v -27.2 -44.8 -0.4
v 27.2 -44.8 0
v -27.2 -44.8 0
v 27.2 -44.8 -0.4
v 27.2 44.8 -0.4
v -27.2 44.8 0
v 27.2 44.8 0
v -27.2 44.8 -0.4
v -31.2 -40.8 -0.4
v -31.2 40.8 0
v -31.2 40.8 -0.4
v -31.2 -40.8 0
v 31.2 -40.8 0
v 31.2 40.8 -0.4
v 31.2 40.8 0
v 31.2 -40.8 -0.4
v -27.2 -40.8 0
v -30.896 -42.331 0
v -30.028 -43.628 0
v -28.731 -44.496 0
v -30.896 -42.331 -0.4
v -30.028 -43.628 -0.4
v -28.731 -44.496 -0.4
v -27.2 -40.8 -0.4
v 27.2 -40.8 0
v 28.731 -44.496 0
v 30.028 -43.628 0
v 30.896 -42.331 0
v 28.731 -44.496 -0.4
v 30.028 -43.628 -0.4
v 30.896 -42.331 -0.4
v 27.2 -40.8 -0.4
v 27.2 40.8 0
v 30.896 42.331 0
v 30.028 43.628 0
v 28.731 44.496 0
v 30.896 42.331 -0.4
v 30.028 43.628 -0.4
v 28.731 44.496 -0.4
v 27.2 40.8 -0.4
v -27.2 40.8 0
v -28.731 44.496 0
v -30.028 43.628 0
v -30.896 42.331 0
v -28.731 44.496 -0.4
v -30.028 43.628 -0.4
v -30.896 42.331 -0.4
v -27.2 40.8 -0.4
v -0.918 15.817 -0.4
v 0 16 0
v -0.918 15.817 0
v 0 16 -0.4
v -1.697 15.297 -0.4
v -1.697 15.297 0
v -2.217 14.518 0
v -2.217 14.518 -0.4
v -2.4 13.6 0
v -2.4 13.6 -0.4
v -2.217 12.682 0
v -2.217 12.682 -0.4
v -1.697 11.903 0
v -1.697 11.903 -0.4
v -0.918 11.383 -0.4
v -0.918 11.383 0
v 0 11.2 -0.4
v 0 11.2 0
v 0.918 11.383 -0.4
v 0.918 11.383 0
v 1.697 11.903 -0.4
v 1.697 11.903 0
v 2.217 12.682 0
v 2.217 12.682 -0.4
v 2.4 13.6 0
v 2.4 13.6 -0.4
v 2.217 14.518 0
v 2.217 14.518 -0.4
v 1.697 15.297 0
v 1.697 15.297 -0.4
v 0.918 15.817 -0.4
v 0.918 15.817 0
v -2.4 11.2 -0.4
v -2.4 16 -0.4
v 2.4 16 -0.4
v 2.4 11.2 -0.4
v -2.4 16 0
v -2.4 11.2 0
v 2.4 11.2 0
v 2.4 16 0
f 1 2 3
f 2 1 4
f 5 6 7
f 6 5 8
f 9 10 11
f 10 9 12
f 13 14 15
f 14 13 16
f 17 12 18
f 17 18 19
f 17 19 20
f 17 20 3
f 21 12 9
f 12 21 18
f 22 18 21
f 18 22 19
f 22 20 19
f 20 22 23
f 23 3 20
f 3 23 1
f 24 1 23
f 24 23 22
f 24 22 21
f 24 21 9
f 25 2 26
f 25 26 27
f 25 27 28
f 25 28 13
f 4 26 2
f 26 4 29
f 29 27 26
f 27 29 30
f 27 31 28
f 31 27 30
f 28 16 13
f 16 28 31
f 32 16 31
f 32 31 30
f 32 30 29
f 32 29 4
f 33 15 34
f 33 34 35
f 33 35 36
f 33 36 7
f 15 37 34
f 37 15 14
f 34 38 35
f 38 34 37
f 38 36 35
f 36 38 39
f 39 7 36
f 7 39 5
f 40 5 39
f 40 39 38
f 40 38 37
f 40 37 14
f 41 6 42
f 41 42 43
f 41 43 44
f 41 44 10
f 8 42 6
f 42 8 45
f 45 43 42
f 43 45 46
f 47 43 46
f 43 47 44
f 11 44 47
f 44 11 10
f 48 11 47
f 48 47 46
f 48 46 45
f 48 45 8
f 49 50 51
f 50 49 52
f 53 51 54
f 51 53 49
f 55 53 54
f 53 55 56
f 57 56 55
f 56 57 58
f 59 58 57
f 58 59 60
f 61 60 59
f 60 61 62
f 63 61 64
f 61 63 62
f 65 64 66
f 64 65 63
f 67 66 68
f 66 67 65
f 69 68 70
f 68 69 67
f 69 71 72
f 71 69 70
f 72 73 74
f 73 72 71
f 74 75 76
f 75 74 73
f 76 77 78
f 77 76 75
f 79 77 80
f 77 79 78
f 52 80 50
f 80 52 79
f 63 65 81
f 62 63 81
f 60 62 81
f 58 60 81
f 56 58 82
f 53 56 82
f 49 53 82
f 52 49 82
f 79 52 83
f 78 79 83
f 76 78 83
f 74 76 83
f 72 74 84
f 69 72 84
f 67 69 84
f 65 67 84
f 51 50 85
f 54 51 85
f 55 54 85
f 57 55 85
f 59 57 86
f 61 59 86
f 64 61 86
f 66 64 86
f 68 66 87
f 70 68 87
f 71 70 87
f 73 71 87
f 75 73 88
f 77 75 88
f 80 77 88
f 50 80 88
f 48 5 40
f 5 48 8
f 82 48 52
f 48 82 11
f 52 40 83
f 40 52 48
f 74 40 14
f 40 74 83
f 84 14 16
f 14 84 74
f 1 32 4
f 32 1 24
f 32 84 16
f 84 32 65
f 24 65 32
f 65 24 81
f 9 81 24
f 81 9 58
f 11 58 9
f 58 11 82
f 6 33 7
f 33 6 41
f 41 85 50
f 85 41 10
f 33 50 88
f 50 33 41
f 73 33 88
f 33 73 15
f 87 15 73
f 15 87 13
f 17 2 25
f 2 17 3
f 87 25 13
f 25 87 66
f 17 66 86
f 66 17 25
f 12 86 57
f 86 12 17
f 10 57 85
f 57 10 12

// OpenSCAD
// file: ../p/4-4edge.scad
use <../lib.scad>
function ldraw_lib__4_4edge() = [
// 0 Circle 1.0
// 0 Name: 4-4edge.dat
// 0 Author: James Jessiman
// 0 !LDRAW_ORG Primitive UPDATE 2017-01
// 0 !LICENSE Licensed under CC BY 2.0 and CC BY 4.0 : see CAreadme.txt
// 
// 0 BFC CERTIFY CCW
  [0,"BFC","CERTIFY"],
  [0,"BFC","CCW"],
// 
// 0 !HISTORY 1998-12-15 [PTadmin] Official Update 1998-10
// 0 !HISTORY 2005-12-28 [PTadmin] Official Update 2005-01
// 0 !HISTORY 2007-06-24 [PTadmin] Header formatted for Contributor Agreement
// 0 !HISTORY 2008-07-01 [PTadmin] Official Update 2008-01
// 0 !HISTORY 2017-01-15 [Steffen] BFCed
// 0 !HISTORY 2017-12-30 [PTadmin] Official Update 2017-01
// 
// 
// 2 24 1 0 0 0.9239 0 0.3827
  [2,24,1,0,0,0.9239,0,0.3827],
// 2 24 0.9239 0 0.3827 0.7071 0 0.7071
  [2,24,0.9239,0,0.3827,0.7071,0,0.7071],
// 2 24 0.7071 0 0.7071 0.3827 0 0.9239
  [2,24,0.7071,0,0.7071,0.3827,0,0.9239],
// 2 24 0.3827 0 0.9239 0 0 1
  [2,24,0.3827,0,0.9239,0,0,1],
// 2 24 0 0 1 -0.3827 0 0.9239
  [2,24,0,0,1,-0.3827,0,0.9239],
// 2 24 -0.3827 0 0.9239 -0.7071 0 0.7071
  [2,24,-0.3827,0,0.9239,-0.7071,0,0.7071],
// 2 24 -0.7071 0 0.7071 -0.9239 0 0.3827
  [2,24,-0.7071,0,0.7071,-0.9239,0,0.3827],
// 2 24 -0.9239 0 0.3827 -1 0 -0
  [2,24,-0.9239,0,0.3827,-1,0,-0],
// 2 24 -1 0 -0 -0.9239 0 -0.3827
  [2,24,-1,0,-0,-0.9239,0,-0.3827],
// 2 24 -0.9239 0 -0.3827 -0.7071 0 -0.7071
  [2,24,-0.9239,0,-0.3827,-0.7071,0,-0.7071],
// 2 24 -0.7071 0 -0.7071 -0.3827 0 -0.9239
  [2,24,-0.7071,0,-0.7071,-0.3827,0,-0.9239],
// 2 24 -0.3827 0 -0.9239 0 0 -1
  [2,24,-0.3827,0,-0.9239,0,0,-1],
// 2 24 0 0 -1 0.3827 0 -0.9239
  [2,24,0,0,-1,0.3827,0,-0.9239],
// 2 24 0.3827 0 -0.9239 0.7071 0 -0.7071
  [2,24,0.3827,0,-0.9239,0.7071,0,-0.7071],
// 2 24 0.7071 0 -0.7071 0.9239 0 -0.3827
  [2,24,0.7071,0,-0.7071,0.9239,0,-0.3827],
// 2 24 0.9239 0 -0.3827 1 0 0
  [2,24,0.9239,0,-0.3827,1,0,0],
];
module ldraw_lib__4_4edge(step=0, col=false, unit=2/5, alt=false, line=0.2, solid=!$preview)
    makepoly(ldraw_lib__4_4edge(), step=step, col=col, unit=unit, alt=alt, line=line, solid=solid);
ldraw_lib__4_4edge(line=0.2);
// file: ../p/4-4cyli.scad
use <../lib.scad>
function ldraw_lib__4_4cyli() = [
// 0 Cylinder 1.0
// 0 Name: 4-4cyli.dat
// 0 Author: James Jessiman
// 0 !LDRAW_ORG Primitive UPDATE 2005-01
// 0 !LICENSE Licensed under CC BY 2.0 and CC BY 4.0 : see CAreadme.txt
// 
// 0 BFC CERTIFY CCW
  [0,"BFC","CERTIFY"],
  [0,"BFC","CCW"],
// 
// 0 !HISTORY 1998-12-15 [PTadmin] Official Update 1998-10
// 0 !HISTORY 2002-03-23 [sbliss] Added BFC statement; merged headers from files in distributions LDraw 0.27 and Complete.
// 0 !HISTORY 2002-04-25 [PTadmin] Official Update 2002-02
// 0 !HISTORY 2004-12-14 [guyvivan] BFC CCW
// 0 !HISTORY 2005-12-28 [PTadmin] Official Update 2005-01
// 0 !HISTORY 2007-06-24 [PTadmin] Header formatted for Contributor Agreement
// 0 !HISTORY 2008-07-01 [PTadmin] Official Update 2008-01
// 
// 
// 4 16 1 1 0 0.9239 1 0.3827 0.9239 0 0.3827 1 0 0
  [4,16,1,1,0,0.9239,1,0.3827,0.9239,0,0.3827,1,0,0],
// 5 24 1 0 0 1 1 0 0.9239 0 0.3827 0.9239 0 -0.3827
  [5,24,1,0,0,1,1,0,0.9239,0,0.3827,0.9239,0,-0.3827],
// 4 16 0.9239 1 0.3827 0.7071 1 0.7071 0.7071 0 0.7071 0.9239 0 0.3827
  [4,16,0.9239,1,0.3827,0.7071,1,0.7071,0.7071,0,0.7071,0.9239,0,0.3827],
// 5 24 0.9239 0 0.3827 0.9239 1 0.3827 0.7071 0 0.7071 1 0 0
  [5,24,0.9239,0,0.3827,0.9239,1,0.3827,0.7071,0,0.7071,1,0,0],
// 4 16 0.7071 1 0.7071 0.3827 1 0.9239 0.3827 0 0.9239 0.7071 0 0.7071
  [4,16,0.7071,1,0.7071,0.3827,1,0.9239,0.3827,0,0.9239,0.7071,0,0.7071],
// 5 24 0.7071 0 0.7071 0.7071 1 0.7071 0.3827 0 0.9239 0.9239 0 0.3827
  [5,24,0.7071,0,0.7071,0.7071,1,0.7071,0.3827,0,0.9239,0.9239,0,0.3827],
// 4 16 0.3827 1 0.9239 0 1 1 0 0 1 0.3827 0 0.9239
  [4,16,0.3827,1,0.9239,0,1,1,0,0,1,0.3827,0,0.9239],
// 5 24 0.3827 0 0.9239 0.3827 1 0.9239 0 0 1 0.7071 0 0.7071
  [5,24,0.3827,0,0.9239,0.3827,1,0.9239,0,0,1,0.7071,0,0.7071],
// 4 16 0 1 1 -0.3827 1 0.9239 -0.3827 0 0.9239 0 0 1
  [4,16,0,1,1,-0.3827,1,0.9239,-0.3827,0,0.9239,0,0,1],
// 5 24 0 0 1 0 1 1 -0.3827 0 0.9239 0.3827 0 0.9239
  [5,24,0,0,1,0,1,1,-0.3827,0,0.9239,0.3827,0,0.9239],
// 4 16 -0.3827 1 0.9239 -0.7071 1 0.7071 -0.7071 0 0.7071 -0.3827 0 0.9239
  [4,16,-0.3827,1,0.9239,-0.7071,1,0.7071,-0.7071,0,0.7071,-0.3827,0,0.9239],
// 5 24 -0.3827 0 0.9239 -0.3827 1 0.9239 -0.7071 0 0.7071 0 0 1
  [5,24,-0.3827,0,0.9239,-0.3827,1,0.9239,-0.7071,0,0.7071,0,0,1],
// 4 16 -0.7071 1 0.7071 -0.9239 1 0.3827 -0.9239 0 0.3827 -0.7071 0 0.7071
  [4,16,-0.7071,1,0.7071,-0.9239,1,0.3827,-0.9239,0,0.3827,-0.7071,0,0.7071],
// 5 24 -0.7071 0 0.7071 -0.7071 1 0.7071 -0.9239 0 0.3827 -0.3827 0 0.9239
  [5,24,-0.7071,0,0.7071,-0.7071,1,0.7071,-0.9239,0,0.3827,-0.3827,0,0.9239],
// 4 16 -0.9239 1 0.3827 -1 1 0 -1 0 0 -0.9239 0 0.3827
  [4,16,-0.9239,1,0.3827,-1,1,0,-1,0,0,-0.9239,0,0.3827],
// 5 24 -0.9239 0 0.3827 -0.9239 1 0.3827 -1 0 0 -0.7071 0 0.7071
  [5,24,-0.9239,0,0.3827,-0.9239,1,0.3827,-1,0,0,-0.7071,0,0.7071],
// 4 16 -1 1 0 -0.9239 1 -0.3827 -0.9239 0 -0.3827 -1 0 0
  [4,16,-1,1,0,-0.9239,1,-0.3827,-0.9239,0,-0.3827,-1,0,0],
// 5 24 -1 0 0 -1 1 0 -0.9239 0 -0.3827 -0.9239 0 0.3827
  [5,24,-1,0,0,-1,1,0,-0.9239,0,-0.3827,-0.9239,0,0.3827],
// 4 16 -0.9239 1 -0.3827 -0.7071 1 -0.7071 -0.7071 0 -0.7071 -0.9239 0 -0.3827
  [4,16,-0.9239,1,-0.3827,-0.7071,1,-0.7071,-0.7071,0,-0.7071,-0.9239,0,-0.3827],
// 5 24 -0.9239 0 -0.3827 -0.9239 1 -0.3827 -0.7071 0 -0.7071 -1 0 0
  [5,24,-0.9239,0,-0.3827,-0.9239,1,-0.3827,-0.7071,0,-0.7071,-1,0,0],
// 4 16 -0.7071 1 -0.7071 -0.3827 1 -0.9239 -0.3827 0 -0.9239 -0.7071 0 -0.7071
  [4,16,-0.7071,1,-0.7071,-0.3827,1,-0.9239,-0.3827,0,-0.9239,-0.7071,0,-0.7071],
// 5 24 -0.7071 0 -0.7071 -0.7071 1 -0.7071 -0.3827 0 -0.9239 -0.9239 0 -0.3827
  [5,24,-0.7071,0,-0.7071,-0.7071,1,-0.7071,-0.3827,0,-0.9239,-0.9239,0,-0.3827],
// 4 16 -0.3827 1 -0.9239 0 1 -1 0 0 -1 -0.3827 0 -0.9239
  [4,16,-0.3827,1,-0.9239,0,1,-1,0,0,-1,-0.3827,0,-0.9239],
// 5 24 -0.3827 0 -0.9239 -0.3827 1 -0.9239 0 0 -1 -0.7071 0 -0.7071
  [5,24,-0.3827,0,-0.9239,-0.3827,1,-0.9239,0,0,-1,-0.7071,0,-0.7071],
// 4 16 0 1 -1 0.3827 1 -0.9239 0.3827 0 -0.9239 0 0 -1
  [4,16,0,1,-1,0.3827,1,-0.9239,0.3827,0,-0.9239,0,0,-1],
// 5 24 0 0 -1 0 1 -1 0.3827 0 -0.9239 -0.3827 0 -0.9239
  [5,24,0,0,-1,0,1,-1,0.3827,0,-0.9239,-0.3827,0,-0.9239],
// 4 16 0.3827 1 -0.9239 0.7071 1 -0.7071 0.7071 0 -0.7071 0.3827 0 -0.9239
  [4,16,0.3827,1,-0.9239,0.7071,1,-0.7071,0.7071,0,-0.7071,0.3827,0,-0.9239],
// 5 24 0.3827 0 -0.9239 0.3827 1 -0.9239 0.7071 0 -0.7071 0 0 -1
  [5,24,0.3827,0,-0.9239,0.3827,1,-0.9239,0.7071,0,-0.7071,0,0,-1],
// 4 16 0.7071 1 -0.7071 0.9239 1 -0.3827 0.9239 0 -0.3827 0.7071 0 -0.7071
  [4,16,0.7071,1,-0.7071,0.9239,1,-0.3827,0.9239,0,-0.3827,0.7071,0,-0.7071],
// 5 24 0.7071 0 -0.7071 0.7071 1 -0.7071 0.9239 0 -0.3827 0.3827 0 -0.9239
  [5,24,0.7071,0,-0.7071,0.7071,1,-0.7071,0.9239,0,-0.3827,0.3827,0,-0.9239],
// 4 16 0.9239 1 -0.3827 1 1 0 1 0 0 0.9239 0 -0.3827
  [4,16,0.9239,1,-0.3827,1,1,0,1,0,0,0.9239,0,-0.3827],
// 5 24 0.9239 0 -0.3827 0.9239 1 -0.3827 1 0 0 0.7071 0 -0.7071
  [5,24,0.9239,0,-0.3827,0.9239,1,-0.3827,1,0,0,0.7071,0,-0.7071],
// 0
];
module ldraw_lib__4_4cyli(step=0, col=false, unit=2/5, alt=false, line=0.2, solid=!$preview)
    makepoly(ldraw_lib__4_4cyli(), step=step, col=col, unit=unit, alt=alt, line=line, solid=solid);
ldraw_lib__4_4cyli(line=0.2);
// file: ../p/1-4edge.scad
use <../lib.scad>
function ldraw_lib__1_4edge() = [
// 0 Circle 0.25
// 0 Name: 1-4edge.dat
// 0 Author: James Jessiman
// 0 !LDRAW_ORG Primitive UPDATE 2017-01
// 0 !LICENSE Licensed under CC BY 2.0 and CC BY 4.0 : see CAreadme.txt
// 
// 0 BFC CERTIFY CCW
  [0,"BFC","CERTIFY"],
  [0,"BFC","CCW"],
// 
// 0 !HISTORY 2007-06-22 [PTadmin] Header formatted for Contributor Agreement
// 0 !HISTORY 2008-07-01 [PTadmin] Official Update 2008-01
// 0 !HISTORY 2017-01-15 [Steffen] BFCed
// 0 !HISTORY 2017-12-30 [PTadmin] Official Update 2017-01
// 
// 
// 2 24 1 0 0 0.9239 0 0.3827
  [2,24,1,0,0,0.9239,0,0.3827],
// 2 24 0.9239 0 0.3827 0.7071 0 0.7071
  [2,24,0.9239,0,0.3827,0.7071,0,0.7071],
// 2 24 0.7071 0 0.7071 0.3827 0 0.9239
  [2,24,0.7071,0,0.7071,0.3827,0,0.9239],
// 2 24 0.3827 0 0.9239 0 0 1
  [2,24,0.3827,0,0.9239,0,0,1],
];
module ldraw_lib__1_4edge(step=0, col=false, unit=2/5, alt=false, line=0.2, solid=!$preview)
    makepoly(ldraw_lib__1_4edge(), step=step, col=col, unit=unit, alt=alt, line=line, solid=solid);
ldraw_lib__1_4edge(line=0.2);
// file: ../p/1-4cyli.scad
use <../lib.scad>
function ldraw_lib__1_4cyli() = [
// 0 Cylinder 0.25
// 0 Name: 1-4cyli.dat
// 0 Author: James Jessiman
// 0 !LDRAW_ORG Primitive UPDATE 2012-01
// 0 !LICENSE Licensed under CC BY 2.0 and CC BY 4.0 : see CAreadme.txt
// 
// 0 BFC CERTIFY CCW
  [0,"BFC","CERTIFY"],
  [0,"BFC","CCW"],
// 
// 0 !HISTORY 2002-03-23 [sbliss] Added BFC statement.
// 0 !HISTORY 2002-04-25 [PTadmin] Official Update 2002-02
// 0 !HISTORY 2007-06-22 [PTadmin] Header formatted for Contributor Agreement
// 0 !HISTORY 2008-07-01 [PTadmin] Official Update 2008-01
// 0 !HISTORY 2012-02-16 [Philo] Changed to CCW
// 0 !HISTORY 2012-03-30 [PTadmin] Official Update 2012-01
// 
// 
// 4 16 1 1 0 0.9239 1 0.3827 0.9239 0 0.3827 1 0 0
  [4,16,1,1,0,0.9239,1,0.3827,0.9239,0,0.3827,1,0,0],
// 5 24 1 0 0 1 1 0 0.9239 0 0.3827 1 0 -1
  [5,24,1,0,0,1,1,0,0.9239,0,0.3827,1,0,-1],
// 4 16 0.9239 1 0.3827 0.7071 1 0.7071 0.7071 0 0.7071 0.9239 0 0.3827
  [4,16,0.9239,1,0.3827,0.7071,1,0.7071,0.7071,0,0.7071,0.9239,0,0.3827],
// 5 24 0.9239 0 0.3827 0.9239 1 0.3827 0.7071 0 0.7071 1 0 0
  [5,24,0.9239,0,0.3827,0.9239,1,0.3827,0.7071,0,0.7071,1,0,0],
// 4 16 0.7071 1 0.7071 0.3827 1 0.9239 0.3827 0 0.9239 0.7071 0 0.7071
  [4,16,0.7071,1,0.7071,0.3827,1,0.9239,0.3827,0,0.9239,0.7071,0,0.7071],
// 5 24 0.7071 0 0.7071 0.7071 1 0.7071 0.3827 0 0.9239 0.9239 0 0.3827
  [5,24,0.7071,0,0.7071,0.7071,1,0.7071,0.3827,0,0.9239,0.9239,0,0.3827],
// 4 16 0.3827 1 0.9239 0 1 1 0 0 1 0.3827 0 0.9239
  [4,16,0.3827,1,0.9239,0,1,1,0,0,1,0.3827,0,0.9239],
// 5 24 0.3827 0 0.9239 0.3827 1 0.9239 0 0 1 0.7071 0 0.7071
  [5,24,0.3827,0,0.9239,0.3827,1,0.9239,0,0,1,0.7071,0,0.7071],
// 5 24 0 0 1 0 1 1 0.3827 0 0.9239 -1 0 1
  [5,24,0,0,1,0,1,1,0.3827,0,0.9239,-1,0,1],
];
module ldraw_lib__1_4cyli(step=0, col=false, unit=2/5, alt=false, line=0.2, solid=!$preview)
    makepoly(ldraw_lib__1_4cyli(), step=step, col=col, unit=unit, alt=alt, line=line, solid=solid);
ldraw_lib__1_4cyli(line=0.2);
// file: ../p/rect2p.scad
use <../lib.scad>
function ldraw_lib__rect2p() = [
// 0 Rectangle with 2 Parallel Edges
// 0 Name: rect2p.dat
// 0 Author: Donald Sutter [technog]
// 0 !LDRAW_ORG Primitive UPDATE 2010-01
// 0 !LICENSE Licensed under CC BY 2.0 and CC BY 4.0 : see CAreadme.txt
// 
// 0 BFC CERTIFY CCW
  [0,"BFC","CERTIFY"],
  [0,"BFC","CCW"],
// 
// 0 !HISTORY 2003-08-01 [PTadmin] Official Update 2003-02
// 0 !HISTORY 2007-06-24 [PTadmin] Header formatted for Contributor Agreement
// 0 !HISTORY 2008-07-01 [PTadmin] Official Update 2008-01
// 0 !HISTORY 2010-01-17 [mikeheide] changed winding to CCW
// 0 !HISTORY 2010-04-05 [PTadmin] Official Update 2010-01
// 
// 
// 2 24 1 0 1 -1 0 1
  [2,24,1,0,1,-1,0,1],
// 2 24 -1 0 -1 1 0 -1
  [2,24,-1,0,-1,1,0,-1],
// 4 16 -1 0 1 -1 0 -1 1 0 -1 1 0 1
  [4,16,-1,0,1,-1,0,-1,1,0,-1,1,0,1],
// 0
];
module ldraw_lib__rect2p(step=0, col=false, unit=2/5, alt=false, line=0.2, solid=!$preview)
    makepoly(ldraw_lib__rect2p(), step=step, col=col, unit=unit, alt=alt, line=line, solid=solid);
ldraw_lib__rect2p(line=0.2);
// file: ../p/4-4ndis.scad
use <../lib.scad>
function ldraw_lib__4_4ndis() = [
// 0 Disc Negative 1.0
// 0 Name: 4-4ndis.dat
// 0 Author: James Jessiman
// 0 !LDRAW_ORG Primitive UPDATE 2012-01
// 0 !LICENSE Licensed under CC BY 2.0 and CC BY 4.0 : see CAreadme.txt
// 
// 0 BFC CERTIFY CCW
  [0,"BFC","CERTIFY"],
  [0,"BFC","CCW"],
// 
// 0 !HISTORY 2002-03-23 [sbliss] Added BFC statement; compacted code
// 0 !HISTORY 2002-04-25 [PTadmin] Official Update 2002-02
// 0 !HISTORY 2007-06-24 [PTadmin] Header formatted for Contributor Agreement
// 0 !HISTORY 2008-07-01 [PTadmin] Official Update 2008-01
// 0 !HISTORY 2012-02-16 [Philo] Changed to CCW
// 0 !HISTORY 2012-03-30 [PTadmin] Official Update 2012-01
// 
// 
// 3 16 0.9239 0 0.3827 1 0 0 1 0 1
  [3,16,0.9239,0,0.3827,1,0,0,1,0,1],
// 3 16 0.7071 0 0.7071 0.9239 0 0.3827 1 0 1
  [3,16,0.7071,0,0.7071,0.9239,0,0.3827,1,0,1],
// 3 16 0.3827 0 0.9239 0.7071 0 0.7071 1 0 1
  [3,16,0.3827,0,0.9239,0.7071,0,0.7071,1,0,1],
// 3 16 0 0 1 0.3827 0 0.9239 1 0 1
  [3,16,0,0,1,0.3827,0,0.9239,1,0,1],
// 3 16 -0.3827 0 0.9239 0 0 1 -1 0 1
  [3,16,-0.3827,0,0.9239,0,0,1,-1,0,1],
// 3 16 -0.7071 0 0.7071 -0.3827 0 0.9239 -1 0 1
  [3,16,-0.7071,0,0.7071,-0.3827,0,0.9239,-1,0,1],
// 3 16 -0.9239 0 0.3827 -0.7071 0 0.7071 -1 0 1
  [3,16,-0.9239,0,0.3827,-0.7071,0,0.7071,-1,0,1],
// 3 16 -1 0 0 -0.9239 0 0.3827 -1 0 1
  [3,16,-1,0,0,-0.9239,0,0.3827,-1,0,1],
// 3 16 -0.9239 0 -0.3827 -1 0 0 -1 0 -1
  [3,16,-0.9239,0,-0.3827,-1,0,0,-1,0,-1],
// 3 16 -0.7071 0 -0.7071 -0.9239 0 -0.3827 -1 0 -1
  [3,16,-0.7071,0,-0.7071,-0.9239,0,-0.3827,-1,0,-1],
// 3 16 -0.3827 0 -0.9239 -0.7071 0 -0.7071 -1 0 -1
  [3,16,-0.3827,0,-0.9239,-0.7071,0,-0.7071,-1,0,-1],
// 3 16 0 0 -1 -0.3827 0 -0.9239 -1 0 -1
  [3,16,0,0,-1,-0.3827,0,-0.9239,-1,0,-1],
// 3 16 0.3827 0 -0.9239 0 0 -1 1 0 -1
  [3,16,0.3827,0,-0.9239,0,0,-1,1,0,-1],
// 3 16 0.7071 0 -0.7071 0.3827 0 -0.9239 1 0 -1
  [3,16,0.7071,0,-0.7071,0.3827,0,-0.9239,1,0,-1],
// 3 16 0.9239 0 -0.3827 0.7071 0 -0.7071 1 0 -1
  [3,16,0.9239,0,-0.3827,0.7071,0,-0.7071,1,0,-1],
// 3 16 1 0 0 0.9239 0 -0.3827 1 0 -1
  [3,16,1,0,0,0.9239,0,-0.3827,1,0,-1],
];
module ldraw_lib__4_4ndis(step=0, col=false, unit=2/5, alt=false, line=0.2, solid=!$preview)
    makepoly(ldraw_lib__4_4ndis(), step=step, col=col, unit=unit, alt=alt, line=line, solid=solid);
ldraw_lib__4_4ndis(line=0.2);
// file: ../p/4-4cylo.scad
use <../lib.scad>
use <4-4cyli.scad>
use <4-4edge.scad>
function ldraw_lib__4_4cylo() = [
// 0 Cylinder Open 1.0
// 0 Name: 4-4cylo.dat
// 0 Author: Mark Kennedy [mkennedy]
// 0 !LDRAW_ORG Primitive UPDATE 2010-01
// 0 !LICENSE Licensed under CC BY 2.0 and CC BY 4.0 : see CAreadme.txt
// 
// 0 BFC CERTIFY CCW
  [0,"BFC","CERTIFY"],
  [0,"BFC","CCW"],
// 
// 0 !HISTORY 2010-04-05 [PTadmin] Official Update 2010-01
// 
// 
// 1 16 0 0 0 1 0 0 0 1 0 0 0 1 4-4edge.dat
  [1,16,0,0,0,1,0,0,0,1,0,0,0,1, ldraw_lib__4_4edge()],
// 1 16 0 1 0 1 0 0 0 1 0 0 0 1 4-4edge.dat
  [1,16,0,1,0,1,0,0,0,1,0,0,0,1, ldraw_lib__4_4edge()],
// 1 16 0 0 0 1 0 0 0 1 0 0 0 1 4-4cyli.dat
  [1,16,0,0,0,1,0,0,0,1,0,0,0,1, ldraw_lib__4_4cyli()],
// 0
];
module ldraw_lib__4_4cylo(step=0, col=false, unit=2/5, alt=false, line=0.2, solid=!$preview)
    makepoly(ldraw_lib__4_4cylo(), step=step, col=col, unit=unit, alt=alt, line=line, solid=solid);
ldraw_lib__4_4cylo(line=0.2);
// file: ../p/1-4disc.scad
use <../lib.scad>
function ldraw_lib__1_4disc() = [
// 0 Disc 0.25
// 0 Name: 1-4disc.dat
// 0 Author: James Jessiman
// 0 !LDRAW_ORG Primitive UPDATE 2002-02
// 0 !LICENSE Licensed under CC BY 2.0 and CC BY 4.0 : see CAreadme.txt
// 
// 0 BFC CERTIFY CCW
  [0,"BFC","CERTIFY"],
  [0,"BFC","CCW"],
// 
// 0 !HISTORY 2002-03-23 [sbliss] Added BFC statement.
// 0 !HISTORY 2002-04-25 [PTadmin] Official Update 2002-02
// 0 !HISTORY 2007-06-22 [PTadmin] Header formatted for Contributor Agreement
// 0 !HISTORY 2008-07-01 [PTadmin] Official Update 2008-01
// 
// 
// 3 16 0 0 0 1 0 0 0.9239 0 0.3827
  [3,16,0,0,0,1,0,0,0.9239,0,0.3827],
// 3 16 0 0 0 0.9239 0 0.3827 0.7071 0 0.7071
  [3,16,0,0,0,0.9239,0,0.3827,0.7071,0,0.7071],
// 3 16 0 0 0 0.7071 0 0.7071 0.3827 0 0.9239
  [3,16,0,0,0,0.7071,0,0.7071,0.3827,0,0.9239],
// 3 16 0 0 0 0.3827 0 0.9239 0 0 1
  [3,16,0,0,0,0.3827,0,0.9239,0,0,1],
// 0
];
module ldraw_lib__1_4disc(step=0, col=false, unit=2/5, alt=false, line=0.2, solid=!$preview)
    makepoly(ldraw_lib__1_4disc(), step=step, col=col, unit=unit, alt=alt, line=line, solid=solid);
ldraw_lib__1_4disc(line=0.2);
// file: ../p/1-4cylc.scad
use <../lib.scad>
use <1-4cyli.scad>
use <1-4disc.scad>
use <1-4edge.scad>
function ldraw_lib__1_4cylc() = [
// 0 Cylinder Closed 0.25
// 0 Name: 1-4cylc.dat
// 0 Author: Mark Kennedy [mkennedy]
// 0 !LDRAW_ORG Primitive UPDATE 2010-01
// 0 !LICENSE Licensed under CC BY 2.0 and CC BY 4.0 : see CAreadme.txt
// 
// 0 BFC CERTIFY CCW
  [0,"BFC","CERTIFY"],
  [0,"BFC","CCW"],
// 
// 0 !HISTORY 2010-04-05 [PTadmin] Official Update 2010-01
// 
// 
// 1 16 0 0 0 1 0 0 0 1 0 0 0 1 1-4edge.dat
  [1,16,0,0,0,1,0,0,0,1,0,0,0,1, ldraw_lib__1_4edge()],
// 1 16 0 1 0 1 0 0 0 1 0 0 0 1 1-4edge.dat
  [1,16,0,1,0,1,0,0,0,1,0,0,0,1, ldraw_lib__1_4edge()],
// 1 16 0 0 0 1 0 0 0 1 0 0 0 1 1-4disc.dat
  [1,16,0,0,0,1,0,0,0,1,0,0,0,1, ldraw_lib__1_4disc()],
// 1 16 0 0 0 1 0 0 0 1 0 0 0 1 1-4cyli.dat
  [1,16,0,0,0,1,0,0,0,1,0,0,0,1, ldraw_lib__1_4cyli()],
// 0
];
module ldraw_lib__1_4cylc(step=0, col=false, unit=2/5, alt=false, line=0.2, solid=!$preview)
    makepoly(ldraw_lib__1_4cylc(), step=step, col=col, unit=unit, alt=alt, line=line, solid=solid);
ldraw_lib__1_4cylc(line=0.2);
// main file
use <../lib.scad>
use <../p/1-4cylc.scad>
use <../p/1-4disc.scad>
use <../p/4-4cylo.scad>
use <../p/4-4ndis.scad>
use <../p/rect2p.scad>
function ldraw_lib__384() = [
// 0 Cardboard Trading Card
// 0 Name: 384.dat
// 0 Author: Michael Heidemann [mikeheide]
// 0 !LDRAW_ORG Part UPDATE 2019-01
// 0 !LICENSE Licensed under CC BY 2.0 and CC BY 4.0 : see CAreadme.txt
// 
// 0 BFC CERTIFY CCW
  [0,"BFC","CERTIFY"],
  [0,"BFC","CCW"],
// 
// 0 !CATEGORY Sheet Cardboard
// 
// 0 !HISTORY 2013-03-16 [MagFors] Reduced filesize, removed t-junctions
// 0 !HISTORY 2013-07-21 [PTadmin] Official Update 2013-01
// 0 !HISTORY 2019-01-25 [cwdee] Update category
// 0 !HISTORY 2019-06-28 [PTadmin] Official Update 2019-01
// 
// 
// 1 16 0 0.5 -112 68 0 0 0 0 -0.5 0 1 0 rect2p.dat
  [1,16,0,0.5,-112,68,0,0,0,0,-0.5,0,1,0, ldraw_lib__rect2p()],
// 1 16 0 0.5 112 -68 0 0 0 0 -0.5 0 -1 0 rect2p.dat
  [1,16,0,0.5,112,-68,0,0,0,0,-0.5,0,-1,0, ldraw_lib__rect2p()],
// 1 16 -78 0.5 0 0 1 0 0 0 -0.5 -102 0 0 rect2p.dat
  [1,16,-78,0.5,0,0,1,0,0,0,-0.5,-102,0,0, ldraw_lib__rect2p()],
// 1 16 78 0.5 0 0 -1 0 0 0 -0.5 102 0 0 rect2p.dat
  [1,16,78,0.5,0,0,-1,0,0,0,-0.5,102,0,0, ldraw_lib__rect2p()],
// 
// 1 16 -68 0 -102 -10 0 0 0 1 0 0 0 -10 1-4cylc.dat
  [1,16,-68,0,-102,-10,0,0,0,1,0,0,0,-10, ldraw_lib__1_4cylc()],
// 1 16 -68 1 -102 0 0 -10 0 -1 0 -10 0 0 1-4disc.dat
  [1,16,-68,1,-102,0,0,-10,0,-1,0,-10,0,0, ldraw_lib__1_4disc()],
// 1 16 68 0 -102 0 0 10 0 1 0 -10 0 0 1-4cylc.dat
  [1,16,68,0,-102,0,0,10,0,1,0,-10,0,0, ldraw_lib__1_4cylc()],
// 1 16 68 1 -102 10 0 0 0 -1 0 0 0 -10 1-4disc.dat
  [1,16,68,1,-102,10,0,0,0,-1,0,0,0,-10, ldraw_lib__1_4disc()],
// 1 16 68 0 102 10 0 0 0 1 0 0 0 10 1-4cylc.dat
  [1,16,68,0,102,10,0,0,0,1,0,0,0,10, ldraw_lib__1_4cylc()],
// 1 16 68 1 102 0 0 10 0 -1 0 10 0 0 1-4disc.dat
  [1,16,68,1,102,0,0,10,0,-1,0,10,0,0, ldraw_lib__1_4disc()],
// 1 16 -68 0 102 0 0 -10 0 1 0 10 0 0 1-4cylc.dat
  [1,16,-68,0,102,0,0,-10,0,1,0,10,0,0, ldraw_lib__1_4cylc()],
// 1 16 -68 1 102 -10 0 0 0 -1 0 0 0 10 1-4disc.dat
  [1,16,-68,1,102,-10,0,0,0,-1,0,0,0,10, ldraw_lib__1_4disc()],
// 
// 0 BFC INVERTNEXT
  [0,"BFC","INVERTNEXT"],
// 1 16 0 0 34 0 0 -6 0 1 0 6 0 0 4-4cylo.dat
  [1,16,0,0,34,0,0,-6,0,1,0,6,0,0, ldraw_lib__4_4cylo()],
// 1 16 0 1 34 0 0 -6 0 -1 0 -6 0 0 4-4ndis.dat
  [1,16,0,1,34,0,0,-6,0,-1,0,-6,0,0, ldraw_lib__4_4ndis()],
// 1 16 0 0 34 0 0 -6 0 1 0 6 0 0 4-4ndis.dat
  [1,16,0,0,34,0,0,-6,0,1,0,6,0,0, ldraw_lib__4_4ndis()],
// 
// 4 16 68 1 102 -68 1 102 -68 1 112 68 1 112
  [4,16,68,1,102,-68,1,102,-68,1,112,68,1,112],
// 4 16 -6 1 40 -78 1 102 -68 1 102 0 1 40
  [4,16,-6,1,40,-78,1,102,-68,1,102,0,1,40],
// 4 16 6 1 40 0 1 40 -68 1 102 68 1 102
  [4,16,6,1,40,0,1,40,-68,1,102,68,1,102],
// 4 16 68 1 102 78 1 102 6 1 34 6 1 40
  [4,16,68,1,102,78,1,102,6,1,34,6,1,40],
// 4 16 6 1 34 78 1 102 78 1 -102 6 1 28
  [4,16,6,1,34,78,1,102,78,1,-102,6,1,28],
// 4 16 68 1 -112 -68 1 -112 -68 1 -102 68 1 -102
  [4,16,68,1,-112,-68,1,-112,-68,1,-102,68,1,-102],
// 4 16 0 1 28 6 1 28 78 1 -102 68 1 -102
  [4,16,0,1,28,6,1,28,78,1,-102,68,1,-102],
// 4 16 68 1 -102 -68 1 -102 -6 1 28 0 1 28
  [4,16,68,1,-102,-68,1,-102,-6,1,28,0,1,28],
// 4 16 -6 1 28 -68 1 -102 -78 1 -102 -6 1 34
  [4,16,-6,1,28,-68,1,-102,-78,1,-102,-6,1,34],
// 4 16 -6 1 34 -78 1 -102 -78 1 102 -6 1 40
  [4,16,-6,1,34,-78,1,-102,-78,1,102,-6,1,40],
// 
// 4 16 68 0 112 -68 0 112 -68 0 102 68 0 102
  [4,16,68,0,112,-68,0,112,-68,0,102,68,0,102],
// 4 16 0 0 40 -68 0 102 -78 0 102 -6 0 40
  [4,16,0,0,40,-68,0,102,-78,0,102,-6,0,40],
// 4 16 68 0 102 -68 0 102 0 0 40 6 0 40
  [4,16,68,0,102,-68,0,102,0,0,40,6,0,40],
// 4 16 6 0 40 6 0 34 78 0 102 68 0 102
  [4,16,6,0,40,6,0,34,78,0,102,68,0,102],
// 4 16 6 0 28 78 0 -102 78 0 102 6 0 34
  [4,16,6,0,28,78,0,-102,78,0,102,6,0,34],
// 4 16 68 0 -102 -68 0 -102 -68 0 -112 68 0 -112
  [4,16,68,0,-102,-68,0,-102,-68,0,-112,68,0,-112],
// 4 16 68 0 -102 78 0 -102 6 0 28 0 0 28
  [4,16,68,0,-102,78,0,-102,6,0,28,0,0,28],
// 4 16 0 0 28 -6 0 28 -68 0 -102 68 0 -102
  [4,16,0,0,28,-6,0,28,-68,0,-102,68,0,-102],
// 4 16 -6 0 34 -78 0 -102 -68 0 -102 -6 0 28
  [4,16,-6,0,34,-78,0,-102,-68,0,-102,-6,0,28],
// 4 16 -6 0 40 -78 0 102 -78 0 -102 -6 0 34
  [4,16,-6,0,40,-78,0,102,-78,0,-102,-6,0,34],
];
module ldraw_lib__384(step=0, col=false, unit=2/5, alt=false, line=0.2, solid=!$preview)
    makepoly(ldraw_lib__384(), step=step, col=col, unit=unit, alt=alt, line=line, solid=solid);
ldraw_lib__384(line=0.2);
